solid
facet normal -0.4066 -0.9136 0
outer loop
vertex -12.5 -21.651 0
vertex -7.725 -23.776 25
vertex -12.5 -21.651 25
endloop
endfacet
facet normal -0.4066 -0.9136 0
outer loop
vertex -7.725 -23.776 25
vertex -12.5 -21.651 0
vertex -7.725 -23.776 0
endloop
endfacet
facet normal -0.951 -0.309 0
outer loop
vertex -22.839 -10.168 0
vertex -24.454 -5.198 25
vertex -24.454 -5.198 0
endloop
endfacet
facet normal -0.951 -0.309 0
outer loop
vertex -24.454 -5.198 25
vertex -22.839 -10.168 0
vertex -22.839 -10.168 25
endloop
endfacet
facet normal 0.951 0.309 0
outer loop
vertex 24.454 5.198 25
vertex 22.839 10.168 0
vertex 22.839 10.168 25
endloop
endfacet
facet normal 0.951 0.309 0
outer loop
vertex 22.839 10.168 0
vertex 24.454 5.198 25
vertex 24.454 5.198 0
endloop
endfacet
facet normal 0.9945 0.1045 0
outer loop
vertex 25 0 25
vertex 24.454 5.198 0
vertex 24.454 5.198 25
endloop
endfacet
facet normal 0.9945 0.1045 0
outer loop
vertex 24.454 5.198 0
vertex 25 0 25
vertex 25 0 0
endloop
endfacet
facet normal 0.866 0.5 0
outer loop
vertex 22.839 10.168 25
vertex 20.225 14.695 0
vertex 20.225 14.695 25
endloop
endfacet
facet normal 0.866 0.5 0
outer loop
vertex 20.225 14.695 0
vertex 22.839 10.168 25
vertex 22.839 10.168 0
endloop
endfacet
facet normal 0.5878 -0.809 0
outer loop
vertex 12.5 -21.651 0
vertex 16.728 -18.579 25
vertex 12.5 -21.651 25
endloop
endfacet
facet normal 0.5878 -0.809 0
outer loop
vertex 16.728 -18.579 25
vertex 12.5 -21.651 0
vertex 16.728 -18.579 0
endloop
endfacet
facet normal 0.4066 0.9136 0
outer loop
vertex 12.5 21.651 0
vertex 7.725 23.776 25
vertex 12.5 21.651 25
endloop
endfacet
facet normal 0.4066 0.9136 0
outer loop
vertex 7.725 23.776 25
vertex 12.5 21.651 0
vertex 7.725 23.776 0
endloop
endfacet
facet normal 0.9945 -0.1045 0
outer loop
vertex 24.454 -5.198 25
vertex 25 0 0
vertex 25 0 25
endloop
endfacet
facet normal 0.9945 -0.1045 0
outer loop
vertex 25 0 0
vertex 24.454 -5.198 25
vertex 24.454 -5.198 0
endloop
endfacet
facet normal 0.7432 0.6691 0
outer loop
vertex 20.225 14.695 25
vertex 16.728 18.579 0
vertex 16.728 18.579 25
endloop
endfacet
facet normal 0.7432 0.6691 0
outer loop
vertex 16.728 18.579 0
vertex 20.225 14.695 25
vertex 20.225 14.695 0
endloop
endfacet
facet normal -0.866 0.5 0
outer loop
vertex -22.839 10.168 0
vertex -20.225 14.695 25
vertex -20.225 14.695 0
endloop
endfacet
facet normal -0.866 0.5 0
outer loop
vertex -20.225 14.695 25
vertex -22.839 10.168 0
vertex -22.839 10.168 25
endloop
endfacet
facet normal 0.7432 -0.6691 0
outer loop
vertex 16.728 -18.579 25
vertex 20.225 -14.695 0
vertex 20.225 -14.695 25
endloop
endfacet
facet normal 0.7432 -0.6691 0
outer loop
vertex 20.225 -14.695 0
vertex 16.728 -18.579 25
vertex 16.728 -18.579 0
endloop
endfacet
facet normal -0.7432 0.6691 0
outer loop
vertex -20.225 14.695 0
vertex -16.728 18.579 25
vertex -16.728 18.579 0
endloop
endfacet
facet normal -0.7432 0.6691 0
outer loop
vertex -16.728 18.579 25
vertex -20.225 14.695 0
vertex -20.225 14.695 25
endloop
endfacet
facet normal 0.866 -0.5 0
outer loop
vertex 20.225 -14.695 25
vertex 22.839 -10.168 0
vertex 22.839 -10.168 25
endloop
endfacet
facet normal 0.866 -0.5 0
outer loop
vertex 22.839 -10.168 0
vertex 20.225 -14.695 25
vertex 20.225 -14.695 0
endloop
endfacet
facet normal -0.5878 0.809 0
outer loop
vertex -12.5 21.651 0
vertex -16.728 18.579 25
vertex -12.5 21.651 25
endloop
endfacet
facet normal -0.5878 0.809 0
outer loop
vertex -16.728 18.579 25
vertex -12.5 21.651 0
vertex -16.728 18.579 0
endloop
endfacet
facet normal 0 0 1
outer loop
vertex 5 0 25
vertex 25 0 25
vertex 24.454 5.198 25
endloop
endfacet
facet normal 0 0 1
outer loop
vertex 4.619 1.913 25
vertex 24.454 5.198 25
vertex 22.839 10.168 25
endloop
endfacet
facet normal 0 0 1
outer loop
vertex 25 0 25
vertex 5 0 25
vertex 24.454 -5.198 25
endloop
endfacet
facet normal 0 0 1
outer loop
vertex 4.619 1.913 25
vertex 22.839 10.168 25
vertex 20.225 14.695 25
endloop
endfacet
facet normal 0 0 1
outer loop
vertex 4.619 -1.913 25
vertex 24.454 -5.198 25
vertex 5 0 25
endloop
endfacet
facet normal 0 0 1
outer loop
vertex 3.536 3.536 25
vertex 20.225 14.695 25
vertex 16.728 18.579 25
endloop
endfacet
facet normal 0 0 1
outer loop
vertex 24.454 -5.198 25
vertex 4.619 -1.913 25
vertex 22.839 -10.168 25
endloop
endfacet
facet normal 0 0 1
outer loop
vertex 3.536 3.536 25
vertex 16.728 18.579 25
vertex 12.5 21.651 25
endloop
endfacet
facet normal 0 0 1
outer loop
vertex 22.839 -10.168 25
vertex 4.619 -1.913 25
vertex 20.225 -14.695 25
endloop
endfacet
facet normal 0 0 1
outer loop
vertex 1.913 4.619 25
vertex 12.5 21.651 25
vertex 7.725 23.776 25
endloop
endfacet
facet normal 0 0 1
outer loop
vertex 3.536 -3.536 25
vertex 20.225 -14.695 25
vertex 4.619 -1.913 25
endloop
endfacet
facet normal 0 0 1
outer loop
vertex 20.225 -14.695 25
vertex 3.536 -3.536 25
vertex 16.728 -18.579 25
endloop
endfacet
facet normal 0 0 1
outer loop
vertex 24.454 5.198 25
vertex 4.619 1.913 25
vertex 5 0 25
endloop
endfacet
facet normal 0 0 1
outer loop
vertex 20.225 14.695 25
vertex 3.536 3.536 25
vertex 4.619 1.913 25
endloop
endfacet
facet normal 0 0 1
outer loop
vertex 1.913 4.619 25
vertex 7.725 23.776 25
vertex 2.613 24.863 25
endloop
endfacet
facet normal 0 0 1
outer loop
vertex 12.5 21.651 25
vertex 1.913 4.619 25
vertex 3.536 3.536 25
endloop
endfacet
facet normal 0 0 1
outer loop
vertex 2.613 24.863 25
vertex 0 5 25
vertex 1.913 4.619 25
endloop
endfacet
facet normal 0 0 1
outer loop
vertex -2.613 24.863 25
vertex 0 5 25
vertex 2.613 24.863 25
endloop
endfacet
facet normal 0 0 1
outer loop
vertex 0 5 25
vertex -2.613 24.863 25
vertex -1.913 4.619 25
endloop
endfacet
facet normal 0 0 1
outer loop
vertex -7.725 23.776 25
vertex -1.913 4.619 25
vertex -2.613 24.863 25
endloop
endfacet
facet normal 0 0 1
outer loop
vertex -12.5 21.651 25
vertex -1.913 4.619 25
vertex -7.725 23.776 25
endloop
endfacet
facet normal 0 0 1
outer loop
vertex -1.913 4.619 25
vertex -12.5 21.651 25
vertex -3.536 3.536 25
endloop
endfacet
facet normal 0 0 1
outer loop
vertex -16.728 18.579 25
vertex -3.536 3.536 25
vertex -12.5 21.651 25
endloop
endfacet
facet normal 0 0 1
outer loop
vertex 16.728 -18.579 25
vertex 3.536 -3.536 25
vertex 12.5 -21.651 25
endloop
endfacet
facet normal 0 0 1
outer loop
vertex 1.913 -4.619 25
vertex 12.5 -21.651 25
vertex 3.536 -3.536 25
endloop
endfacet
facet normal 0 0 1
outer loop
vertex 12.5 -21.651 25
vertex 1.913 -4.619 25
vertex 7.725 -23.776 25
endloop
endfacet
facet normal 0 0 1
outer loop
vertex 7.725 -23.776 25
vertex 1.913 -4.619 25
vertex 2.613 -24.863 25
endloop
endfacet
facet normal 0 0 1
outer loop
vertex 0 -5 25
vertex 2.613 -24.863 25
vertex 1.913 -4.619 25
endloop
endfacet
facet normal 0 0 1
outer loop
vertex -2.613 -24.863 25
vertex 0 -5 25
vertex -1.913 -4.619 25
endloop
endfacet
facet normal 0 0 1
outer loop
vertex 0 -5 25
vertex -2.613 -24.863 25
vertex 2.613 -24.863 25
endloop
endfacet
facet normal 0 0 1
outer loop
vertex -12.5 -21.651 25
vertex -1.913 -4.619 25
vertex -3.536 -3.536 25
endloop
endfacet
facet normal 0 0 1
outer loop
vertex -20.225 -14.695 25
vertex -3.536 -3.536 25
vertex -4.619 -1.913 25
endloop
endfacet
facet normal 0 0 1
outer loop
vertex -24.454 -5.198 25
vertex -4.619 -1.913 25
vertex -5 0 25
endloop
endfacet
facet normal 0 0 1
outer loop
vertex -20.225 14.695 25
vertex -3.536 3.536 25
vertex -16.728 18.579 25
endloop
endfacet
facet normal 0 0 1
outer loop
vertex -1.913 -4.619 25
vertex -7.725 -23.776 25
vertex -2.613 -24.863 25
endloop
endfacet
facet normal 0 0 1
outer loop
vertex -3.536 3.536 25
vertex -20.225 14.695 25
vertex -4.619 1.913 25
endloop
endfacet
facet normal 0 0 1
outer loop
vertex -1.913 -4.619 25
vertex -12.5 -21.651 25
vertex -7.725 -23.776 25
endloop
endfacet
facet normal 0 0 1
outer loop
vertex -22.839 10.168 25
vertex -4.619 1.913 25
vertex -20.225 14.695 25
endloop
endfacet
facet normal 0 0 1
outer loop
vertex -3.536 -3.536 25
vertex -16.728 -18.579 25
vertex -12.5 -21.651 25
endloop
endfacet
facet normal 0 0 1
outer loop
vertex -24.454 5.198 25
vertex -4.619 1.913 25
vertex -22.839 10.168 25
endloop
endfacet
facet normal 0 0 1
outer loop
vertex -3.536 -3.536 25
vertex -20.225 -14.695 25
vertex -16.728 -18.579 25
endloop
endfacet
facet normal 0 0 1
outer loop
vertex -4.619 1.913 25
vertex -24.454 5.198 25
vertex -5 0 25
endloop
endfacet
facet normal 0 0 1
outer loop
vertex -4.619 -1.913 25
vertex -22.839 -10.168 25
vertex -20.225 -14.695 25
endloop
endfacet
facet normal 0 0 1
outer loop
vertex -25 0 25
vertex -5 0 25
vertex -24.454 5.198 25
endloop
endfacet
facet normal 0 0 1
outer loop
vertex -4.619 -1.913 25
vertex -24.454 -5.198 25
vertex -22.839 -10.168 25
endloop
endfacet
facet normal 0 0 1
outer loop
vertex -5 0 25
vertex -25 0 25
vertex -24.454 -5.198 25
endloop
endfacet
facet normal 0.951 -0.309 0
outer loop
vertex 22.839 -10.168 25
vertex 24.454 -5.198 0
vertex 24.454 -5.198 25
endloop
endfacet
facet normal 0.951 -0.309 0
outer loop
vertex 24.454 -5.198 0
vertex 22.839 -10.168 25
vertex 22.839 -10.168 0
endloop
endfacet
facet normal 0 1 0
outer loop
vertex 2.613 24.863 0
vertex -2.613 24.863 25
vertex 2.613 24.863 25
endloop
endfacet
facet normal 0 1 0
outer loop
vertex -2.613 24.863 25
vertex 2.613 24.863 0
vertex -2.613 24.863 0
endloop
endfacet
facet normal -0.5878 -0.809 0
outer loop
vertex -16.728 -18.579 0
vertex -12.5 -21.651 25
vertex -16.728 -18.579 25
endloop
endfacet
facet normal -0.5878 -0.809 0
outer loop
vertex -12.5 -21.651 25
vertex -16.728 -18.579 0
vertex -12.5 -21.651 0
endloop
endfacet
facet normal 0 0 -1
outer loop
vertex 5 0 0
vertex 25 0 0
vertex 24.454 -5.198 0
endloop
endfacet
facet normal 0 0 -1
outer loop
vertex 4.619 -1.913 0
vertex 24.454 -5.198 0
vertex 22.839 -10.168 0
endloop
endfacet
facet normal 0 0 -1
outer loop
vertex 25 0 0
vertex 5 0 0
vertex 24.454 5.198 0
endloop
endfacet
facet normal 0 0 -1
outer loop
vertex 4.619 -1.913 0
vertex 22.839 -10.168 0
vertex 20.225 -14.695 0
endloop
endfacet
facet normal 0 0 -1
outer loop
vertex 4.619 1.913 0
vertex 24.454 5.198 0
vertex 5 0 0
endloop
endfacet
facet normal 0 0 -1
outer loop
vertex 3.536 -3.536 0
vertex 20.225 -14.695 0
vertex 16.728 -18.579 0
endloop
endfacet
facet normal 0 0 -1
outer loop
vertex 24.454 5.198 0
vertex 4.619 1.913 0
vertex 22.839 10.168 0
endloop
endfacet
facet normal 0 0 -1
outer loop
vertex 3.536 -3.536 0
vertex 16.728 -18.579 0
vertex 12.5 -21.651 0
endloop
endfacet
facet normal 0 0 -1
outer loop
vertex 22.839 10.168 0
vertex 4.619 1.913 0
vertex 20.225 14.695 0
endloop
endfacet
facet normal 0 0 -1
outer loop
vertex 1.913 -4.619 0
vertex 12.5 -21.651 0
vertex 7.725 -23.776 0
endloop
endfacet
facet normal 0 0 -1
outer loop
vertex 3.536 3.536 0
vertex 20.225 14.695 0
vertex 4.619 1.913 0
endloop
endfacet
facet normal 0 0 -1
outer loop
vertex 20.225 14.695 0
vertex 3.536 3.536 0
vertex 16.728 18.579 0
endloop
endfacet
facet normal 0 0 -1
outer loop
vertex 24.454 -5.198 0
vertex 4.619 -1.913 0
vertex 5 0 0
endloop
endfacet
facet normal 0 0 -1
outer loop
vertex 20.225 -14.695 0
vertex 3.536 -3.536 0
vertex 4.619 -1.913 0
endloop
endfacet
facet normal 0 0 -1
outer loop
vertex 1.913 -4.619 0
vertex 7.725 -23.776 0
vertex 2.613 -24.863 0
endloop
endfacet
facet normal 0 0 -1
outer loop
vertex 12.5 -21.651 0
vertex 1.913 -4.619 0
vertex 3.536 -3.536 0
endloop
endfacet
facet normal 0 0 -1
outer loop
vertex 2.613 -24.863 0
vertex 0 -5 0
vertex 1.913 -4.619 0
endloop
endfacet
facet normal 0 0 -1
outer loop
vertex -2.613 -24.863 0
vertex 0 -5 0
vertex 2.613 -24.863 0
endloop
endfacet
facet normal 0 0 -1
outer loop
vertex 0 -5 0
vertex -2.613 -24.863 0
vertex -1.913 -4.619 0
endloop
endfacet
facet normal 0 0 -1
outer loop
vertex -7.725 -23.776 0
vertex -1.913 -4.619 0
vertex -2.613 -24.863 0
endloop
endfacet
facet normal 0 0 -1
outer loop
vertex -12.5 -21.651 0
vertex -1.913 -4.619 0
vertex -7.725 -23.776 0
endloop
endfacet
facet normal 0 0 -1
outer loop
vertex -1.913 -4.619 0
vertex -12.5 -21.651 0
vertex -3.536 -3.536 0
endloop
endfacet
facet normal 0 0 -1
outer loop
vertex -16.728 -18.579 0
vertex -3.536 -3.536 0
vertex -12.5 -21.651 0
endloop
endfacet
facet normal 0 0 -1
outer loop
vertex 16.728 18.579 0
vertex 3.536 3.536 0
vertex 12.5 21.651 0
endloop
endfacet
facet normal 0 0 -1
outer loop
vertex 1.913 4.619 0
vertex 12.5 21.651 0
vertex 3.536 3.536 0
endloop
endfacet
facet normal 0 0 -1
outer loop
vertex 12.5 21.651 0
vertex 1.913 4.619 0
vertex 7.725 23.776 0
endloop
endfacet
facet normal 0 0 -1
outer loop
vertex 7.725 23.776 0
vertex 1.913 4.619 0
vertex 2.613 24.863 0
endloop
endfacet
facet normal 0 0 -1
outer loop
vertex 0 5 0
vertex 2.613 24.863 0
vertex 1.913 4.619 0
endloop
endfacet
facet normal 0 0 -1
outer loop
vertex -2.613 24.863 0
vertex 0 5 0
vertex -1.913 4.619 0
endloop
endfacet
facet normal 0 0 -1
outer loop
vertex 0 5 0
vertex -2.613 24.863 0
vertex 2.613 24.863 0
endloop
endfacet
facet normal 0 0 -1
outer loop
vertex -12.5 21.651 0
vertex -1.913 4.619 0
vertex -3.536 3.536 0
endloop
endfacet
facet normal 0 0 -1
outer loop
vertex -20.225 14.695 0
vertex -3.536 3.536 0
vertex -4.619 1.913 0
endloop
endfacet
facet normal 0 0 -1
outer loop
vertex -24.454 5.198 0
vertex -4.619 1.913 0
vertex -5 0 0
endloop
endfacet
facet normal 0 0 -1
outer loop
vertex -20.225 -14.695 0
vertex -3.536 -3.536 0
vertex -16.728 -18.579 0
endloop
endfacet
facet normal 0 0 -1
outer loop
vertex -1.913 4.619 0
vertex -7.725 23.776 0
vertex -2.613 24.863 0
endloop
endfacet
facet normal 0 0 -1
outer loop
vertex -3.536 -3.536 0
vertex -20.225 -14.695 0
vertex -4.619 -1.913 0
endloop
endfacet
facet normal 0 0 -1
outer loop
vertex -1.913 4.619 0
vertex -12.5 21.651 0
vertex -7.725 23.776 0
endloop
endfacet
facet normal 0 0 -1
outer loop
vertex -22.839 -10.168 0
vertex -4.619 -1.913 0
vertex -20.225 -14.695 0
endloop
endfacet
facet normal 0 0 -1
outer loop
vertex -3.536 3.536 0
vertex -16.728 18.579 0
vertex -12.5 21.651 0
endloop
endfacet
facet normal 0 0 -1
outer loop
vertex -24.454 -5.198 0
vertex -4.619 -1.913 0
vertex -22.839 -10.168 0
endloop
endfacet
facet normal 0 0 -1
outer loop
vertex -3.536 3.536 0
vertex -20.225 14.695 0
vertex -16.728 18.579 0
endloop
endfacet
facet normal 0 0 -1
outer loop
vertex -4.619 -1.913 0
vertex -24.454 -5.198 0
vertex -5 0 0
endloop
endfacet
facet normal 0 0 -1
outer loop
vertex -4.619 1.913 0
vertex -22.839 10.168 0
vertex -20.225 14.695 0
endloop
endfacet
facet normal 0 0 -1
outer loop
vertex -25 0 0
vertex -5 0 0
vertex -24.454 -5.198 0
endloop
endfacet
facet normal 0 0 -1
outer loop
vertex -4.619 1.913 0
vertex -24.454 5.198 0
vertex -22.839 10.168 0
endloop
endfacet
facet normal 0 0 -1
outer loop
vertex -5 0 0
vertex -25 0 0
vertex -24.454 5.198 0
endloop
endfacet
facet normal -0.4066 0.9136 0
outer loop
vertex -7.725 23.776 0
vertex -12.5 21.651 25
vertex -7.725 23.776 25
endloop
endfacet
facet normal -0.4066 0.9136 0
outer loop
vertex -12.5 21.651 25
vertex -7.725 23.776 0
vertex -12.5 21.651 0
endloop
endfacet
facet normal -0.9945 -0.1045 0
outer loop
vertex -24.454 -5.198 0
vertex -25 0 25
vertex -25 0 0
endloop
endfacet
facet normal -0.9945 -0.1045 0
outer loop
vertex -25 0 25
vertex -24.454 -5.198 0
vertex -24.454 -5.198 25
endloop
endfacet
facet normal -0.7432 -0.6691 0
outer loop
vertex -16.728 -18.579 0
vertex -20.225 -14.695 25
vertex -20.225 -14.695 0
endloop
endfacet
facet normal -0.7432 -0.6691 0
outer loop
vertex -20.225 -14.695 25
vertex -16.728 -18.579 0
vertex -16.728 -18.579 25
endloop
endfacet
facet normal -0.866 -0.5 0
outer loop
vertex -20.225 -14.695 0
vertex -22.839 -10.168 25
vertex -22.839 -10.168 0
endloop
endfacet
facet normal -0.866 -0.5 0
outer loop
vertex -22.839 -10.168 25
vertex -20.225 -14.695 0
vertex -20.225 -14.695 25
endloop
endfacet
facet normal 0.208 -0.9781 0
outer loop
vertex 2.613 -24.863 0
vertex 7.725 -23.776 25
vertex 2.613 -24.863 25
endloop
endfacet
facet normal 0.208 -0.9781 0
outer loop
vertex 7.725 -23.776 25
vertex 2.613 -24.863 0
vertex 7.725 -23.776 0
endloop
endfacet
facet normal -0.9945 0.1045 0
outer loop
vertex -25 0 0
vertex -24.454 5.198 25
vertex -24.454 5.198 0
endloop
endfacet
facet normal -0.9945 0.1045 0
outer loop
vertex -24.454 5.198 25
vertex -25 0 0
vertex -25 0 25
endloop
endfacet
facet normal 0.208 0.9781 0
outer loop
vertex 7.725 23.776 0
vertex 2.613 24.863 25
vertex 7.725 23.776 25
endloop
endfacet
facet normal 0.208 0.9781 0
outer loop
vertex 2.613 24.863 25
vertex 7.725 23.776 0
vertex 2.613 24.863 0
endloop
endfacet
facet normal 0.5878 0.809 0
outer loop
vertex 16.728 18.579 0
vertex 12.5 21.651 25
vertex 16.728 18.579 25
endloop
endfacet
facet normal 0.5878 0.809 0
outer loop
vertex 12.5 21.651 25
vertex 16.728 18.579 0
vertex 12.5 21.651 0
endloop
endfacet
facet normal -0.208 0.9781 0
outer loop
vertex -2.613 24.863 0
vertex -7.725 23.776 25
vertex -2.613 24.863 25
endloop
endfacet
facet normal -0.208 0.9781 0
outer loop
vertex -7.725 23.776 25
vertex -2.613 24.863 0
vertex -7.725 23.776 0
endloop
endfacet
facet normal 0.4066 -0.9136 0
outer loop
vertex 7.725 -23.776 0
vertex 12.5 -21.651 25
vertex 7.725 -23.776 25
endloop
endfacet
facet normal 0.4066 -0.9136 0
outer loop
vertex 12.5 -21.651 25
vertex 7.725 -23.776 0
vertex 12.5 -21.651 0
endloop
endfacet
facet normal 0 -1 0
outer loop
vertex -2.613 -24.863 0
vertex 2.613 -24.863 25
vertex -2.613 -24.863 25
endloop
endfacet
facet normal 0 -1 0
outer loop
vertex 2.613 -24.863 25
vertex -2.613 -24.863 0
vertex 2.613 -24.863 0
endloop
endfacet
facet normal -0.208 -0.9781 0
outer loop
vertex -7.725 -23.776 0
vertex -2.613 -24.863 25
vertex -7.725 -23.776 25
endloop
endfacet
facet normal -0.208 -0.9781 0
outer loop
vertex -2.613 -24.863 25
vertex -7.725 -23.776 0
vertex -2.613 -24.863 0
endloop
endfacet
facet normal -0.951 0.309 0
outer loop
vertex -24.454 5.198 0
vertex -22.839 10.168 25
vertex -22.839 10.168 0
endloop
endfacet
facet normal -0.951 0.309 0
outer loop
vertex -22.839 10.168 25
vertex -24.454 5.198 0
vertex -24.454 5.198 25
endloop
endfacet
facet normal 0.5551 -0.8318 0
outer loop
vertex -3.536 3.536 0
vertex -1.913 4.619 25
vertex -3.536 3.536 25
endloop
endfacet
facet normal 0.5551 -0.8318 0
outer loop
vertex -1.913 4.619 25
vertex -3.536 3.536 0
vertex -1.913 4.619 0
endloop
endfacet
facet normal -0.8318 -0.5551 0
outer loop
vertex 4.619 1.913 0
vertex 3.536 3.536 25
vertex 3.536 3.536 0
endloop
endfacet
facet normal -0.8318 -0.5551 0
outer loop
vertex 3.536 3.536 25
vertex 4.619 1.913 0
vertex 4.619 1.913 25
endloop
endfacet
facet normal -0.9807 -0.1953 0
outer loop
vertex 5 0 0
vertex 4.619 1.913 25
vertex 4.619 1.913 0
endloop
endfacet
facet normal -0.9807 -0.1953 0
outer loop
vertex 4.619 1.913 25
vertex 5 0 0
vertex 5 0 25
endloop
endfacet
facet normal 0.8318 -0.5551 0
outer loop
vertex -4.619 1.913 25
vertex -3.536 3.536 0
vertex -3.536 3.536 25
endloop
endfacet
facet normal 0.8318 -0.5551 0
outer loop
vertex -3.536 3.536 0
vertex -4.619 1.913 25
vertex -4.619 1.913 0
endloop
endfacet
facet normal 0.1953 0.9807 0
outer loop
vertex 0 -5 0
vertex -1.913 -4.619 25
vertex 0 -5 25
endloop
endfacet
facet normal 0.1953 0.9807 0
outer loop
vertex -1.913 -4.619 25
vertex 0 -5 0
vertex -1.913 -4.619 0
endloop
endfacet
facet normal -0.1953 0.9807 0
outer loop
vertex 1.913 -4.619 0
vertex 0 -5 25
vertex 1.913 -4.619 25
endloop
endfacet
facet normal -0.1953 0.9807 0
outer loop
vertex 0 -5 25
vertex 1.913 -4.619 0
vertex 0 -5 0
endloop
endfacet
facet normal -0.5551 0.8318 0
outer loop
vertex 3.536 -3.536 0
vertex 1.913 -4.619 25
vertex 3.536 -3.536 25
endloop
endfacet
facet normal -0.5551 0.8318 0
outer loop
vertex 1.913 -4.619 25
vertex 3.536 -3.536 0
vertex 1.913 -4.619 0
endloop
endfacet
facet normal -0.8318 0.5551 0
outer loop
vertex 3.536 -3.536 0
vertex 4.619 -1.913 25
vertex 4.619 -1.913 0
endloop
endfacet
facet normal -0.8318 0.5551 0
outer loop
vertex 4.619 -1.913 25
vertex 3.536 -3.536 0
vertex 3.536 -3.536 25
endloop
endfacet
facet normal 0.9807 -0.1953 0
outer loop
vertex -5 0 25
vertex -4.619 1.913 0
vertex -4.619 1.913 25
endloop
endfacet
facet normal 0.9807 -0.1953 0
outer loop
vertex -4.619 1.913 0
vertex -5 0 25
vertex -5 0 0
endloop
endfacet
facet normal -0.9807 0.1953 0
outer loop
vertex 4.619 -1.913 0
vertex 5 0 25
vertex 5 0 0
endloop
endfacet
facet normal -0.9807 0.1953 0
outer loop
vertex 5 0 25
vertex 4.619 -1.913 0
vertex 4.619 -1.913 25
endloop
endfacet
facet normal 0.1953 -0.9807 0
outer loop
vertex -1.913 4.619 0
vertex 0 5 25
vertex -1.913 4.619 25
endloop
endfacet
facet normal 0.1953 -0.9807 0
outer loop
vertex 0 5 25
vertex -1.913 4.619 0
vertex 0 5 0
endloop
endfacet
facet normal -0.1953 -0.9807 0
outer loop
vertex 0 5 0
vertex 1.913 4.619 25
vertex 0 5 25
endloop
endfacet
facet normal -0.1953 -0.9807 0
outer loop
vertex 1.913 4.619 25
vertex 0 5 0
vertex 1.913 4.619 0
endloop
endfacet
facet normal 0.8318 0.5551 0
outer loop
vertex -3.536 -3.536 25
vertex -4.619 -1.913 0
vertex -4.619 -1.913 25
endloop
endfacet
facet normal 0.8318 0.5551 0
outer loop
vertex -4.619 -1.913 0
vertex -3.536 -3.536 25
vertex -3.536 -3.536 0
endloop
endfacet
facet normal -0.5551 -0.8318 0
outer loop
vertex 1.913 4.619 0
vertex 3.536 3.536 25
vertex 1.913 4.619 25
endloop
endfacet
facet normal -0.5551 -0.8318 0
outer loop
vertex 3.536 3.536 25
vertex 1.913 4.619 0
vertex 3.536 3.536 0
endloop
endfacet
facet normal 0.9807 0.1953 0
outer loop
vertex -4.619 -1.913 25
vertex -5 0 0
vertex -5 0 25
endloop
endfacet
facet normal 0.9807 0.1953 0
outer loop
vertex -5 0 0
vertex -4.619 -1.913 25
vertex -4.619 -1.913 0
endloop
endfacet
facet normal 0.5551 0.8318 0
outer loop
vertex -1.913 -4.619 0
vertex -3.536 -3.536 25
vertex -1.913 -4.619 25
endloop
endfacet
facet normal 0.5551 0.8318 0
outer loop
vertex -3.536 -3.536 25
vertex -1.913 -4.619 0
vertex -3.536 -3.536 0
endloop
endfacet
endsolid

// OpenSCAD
difference()
{
    cylinder(r=25, h=25);
    translate([0,0,-1]) cylinder(r=5, h=27);
}
